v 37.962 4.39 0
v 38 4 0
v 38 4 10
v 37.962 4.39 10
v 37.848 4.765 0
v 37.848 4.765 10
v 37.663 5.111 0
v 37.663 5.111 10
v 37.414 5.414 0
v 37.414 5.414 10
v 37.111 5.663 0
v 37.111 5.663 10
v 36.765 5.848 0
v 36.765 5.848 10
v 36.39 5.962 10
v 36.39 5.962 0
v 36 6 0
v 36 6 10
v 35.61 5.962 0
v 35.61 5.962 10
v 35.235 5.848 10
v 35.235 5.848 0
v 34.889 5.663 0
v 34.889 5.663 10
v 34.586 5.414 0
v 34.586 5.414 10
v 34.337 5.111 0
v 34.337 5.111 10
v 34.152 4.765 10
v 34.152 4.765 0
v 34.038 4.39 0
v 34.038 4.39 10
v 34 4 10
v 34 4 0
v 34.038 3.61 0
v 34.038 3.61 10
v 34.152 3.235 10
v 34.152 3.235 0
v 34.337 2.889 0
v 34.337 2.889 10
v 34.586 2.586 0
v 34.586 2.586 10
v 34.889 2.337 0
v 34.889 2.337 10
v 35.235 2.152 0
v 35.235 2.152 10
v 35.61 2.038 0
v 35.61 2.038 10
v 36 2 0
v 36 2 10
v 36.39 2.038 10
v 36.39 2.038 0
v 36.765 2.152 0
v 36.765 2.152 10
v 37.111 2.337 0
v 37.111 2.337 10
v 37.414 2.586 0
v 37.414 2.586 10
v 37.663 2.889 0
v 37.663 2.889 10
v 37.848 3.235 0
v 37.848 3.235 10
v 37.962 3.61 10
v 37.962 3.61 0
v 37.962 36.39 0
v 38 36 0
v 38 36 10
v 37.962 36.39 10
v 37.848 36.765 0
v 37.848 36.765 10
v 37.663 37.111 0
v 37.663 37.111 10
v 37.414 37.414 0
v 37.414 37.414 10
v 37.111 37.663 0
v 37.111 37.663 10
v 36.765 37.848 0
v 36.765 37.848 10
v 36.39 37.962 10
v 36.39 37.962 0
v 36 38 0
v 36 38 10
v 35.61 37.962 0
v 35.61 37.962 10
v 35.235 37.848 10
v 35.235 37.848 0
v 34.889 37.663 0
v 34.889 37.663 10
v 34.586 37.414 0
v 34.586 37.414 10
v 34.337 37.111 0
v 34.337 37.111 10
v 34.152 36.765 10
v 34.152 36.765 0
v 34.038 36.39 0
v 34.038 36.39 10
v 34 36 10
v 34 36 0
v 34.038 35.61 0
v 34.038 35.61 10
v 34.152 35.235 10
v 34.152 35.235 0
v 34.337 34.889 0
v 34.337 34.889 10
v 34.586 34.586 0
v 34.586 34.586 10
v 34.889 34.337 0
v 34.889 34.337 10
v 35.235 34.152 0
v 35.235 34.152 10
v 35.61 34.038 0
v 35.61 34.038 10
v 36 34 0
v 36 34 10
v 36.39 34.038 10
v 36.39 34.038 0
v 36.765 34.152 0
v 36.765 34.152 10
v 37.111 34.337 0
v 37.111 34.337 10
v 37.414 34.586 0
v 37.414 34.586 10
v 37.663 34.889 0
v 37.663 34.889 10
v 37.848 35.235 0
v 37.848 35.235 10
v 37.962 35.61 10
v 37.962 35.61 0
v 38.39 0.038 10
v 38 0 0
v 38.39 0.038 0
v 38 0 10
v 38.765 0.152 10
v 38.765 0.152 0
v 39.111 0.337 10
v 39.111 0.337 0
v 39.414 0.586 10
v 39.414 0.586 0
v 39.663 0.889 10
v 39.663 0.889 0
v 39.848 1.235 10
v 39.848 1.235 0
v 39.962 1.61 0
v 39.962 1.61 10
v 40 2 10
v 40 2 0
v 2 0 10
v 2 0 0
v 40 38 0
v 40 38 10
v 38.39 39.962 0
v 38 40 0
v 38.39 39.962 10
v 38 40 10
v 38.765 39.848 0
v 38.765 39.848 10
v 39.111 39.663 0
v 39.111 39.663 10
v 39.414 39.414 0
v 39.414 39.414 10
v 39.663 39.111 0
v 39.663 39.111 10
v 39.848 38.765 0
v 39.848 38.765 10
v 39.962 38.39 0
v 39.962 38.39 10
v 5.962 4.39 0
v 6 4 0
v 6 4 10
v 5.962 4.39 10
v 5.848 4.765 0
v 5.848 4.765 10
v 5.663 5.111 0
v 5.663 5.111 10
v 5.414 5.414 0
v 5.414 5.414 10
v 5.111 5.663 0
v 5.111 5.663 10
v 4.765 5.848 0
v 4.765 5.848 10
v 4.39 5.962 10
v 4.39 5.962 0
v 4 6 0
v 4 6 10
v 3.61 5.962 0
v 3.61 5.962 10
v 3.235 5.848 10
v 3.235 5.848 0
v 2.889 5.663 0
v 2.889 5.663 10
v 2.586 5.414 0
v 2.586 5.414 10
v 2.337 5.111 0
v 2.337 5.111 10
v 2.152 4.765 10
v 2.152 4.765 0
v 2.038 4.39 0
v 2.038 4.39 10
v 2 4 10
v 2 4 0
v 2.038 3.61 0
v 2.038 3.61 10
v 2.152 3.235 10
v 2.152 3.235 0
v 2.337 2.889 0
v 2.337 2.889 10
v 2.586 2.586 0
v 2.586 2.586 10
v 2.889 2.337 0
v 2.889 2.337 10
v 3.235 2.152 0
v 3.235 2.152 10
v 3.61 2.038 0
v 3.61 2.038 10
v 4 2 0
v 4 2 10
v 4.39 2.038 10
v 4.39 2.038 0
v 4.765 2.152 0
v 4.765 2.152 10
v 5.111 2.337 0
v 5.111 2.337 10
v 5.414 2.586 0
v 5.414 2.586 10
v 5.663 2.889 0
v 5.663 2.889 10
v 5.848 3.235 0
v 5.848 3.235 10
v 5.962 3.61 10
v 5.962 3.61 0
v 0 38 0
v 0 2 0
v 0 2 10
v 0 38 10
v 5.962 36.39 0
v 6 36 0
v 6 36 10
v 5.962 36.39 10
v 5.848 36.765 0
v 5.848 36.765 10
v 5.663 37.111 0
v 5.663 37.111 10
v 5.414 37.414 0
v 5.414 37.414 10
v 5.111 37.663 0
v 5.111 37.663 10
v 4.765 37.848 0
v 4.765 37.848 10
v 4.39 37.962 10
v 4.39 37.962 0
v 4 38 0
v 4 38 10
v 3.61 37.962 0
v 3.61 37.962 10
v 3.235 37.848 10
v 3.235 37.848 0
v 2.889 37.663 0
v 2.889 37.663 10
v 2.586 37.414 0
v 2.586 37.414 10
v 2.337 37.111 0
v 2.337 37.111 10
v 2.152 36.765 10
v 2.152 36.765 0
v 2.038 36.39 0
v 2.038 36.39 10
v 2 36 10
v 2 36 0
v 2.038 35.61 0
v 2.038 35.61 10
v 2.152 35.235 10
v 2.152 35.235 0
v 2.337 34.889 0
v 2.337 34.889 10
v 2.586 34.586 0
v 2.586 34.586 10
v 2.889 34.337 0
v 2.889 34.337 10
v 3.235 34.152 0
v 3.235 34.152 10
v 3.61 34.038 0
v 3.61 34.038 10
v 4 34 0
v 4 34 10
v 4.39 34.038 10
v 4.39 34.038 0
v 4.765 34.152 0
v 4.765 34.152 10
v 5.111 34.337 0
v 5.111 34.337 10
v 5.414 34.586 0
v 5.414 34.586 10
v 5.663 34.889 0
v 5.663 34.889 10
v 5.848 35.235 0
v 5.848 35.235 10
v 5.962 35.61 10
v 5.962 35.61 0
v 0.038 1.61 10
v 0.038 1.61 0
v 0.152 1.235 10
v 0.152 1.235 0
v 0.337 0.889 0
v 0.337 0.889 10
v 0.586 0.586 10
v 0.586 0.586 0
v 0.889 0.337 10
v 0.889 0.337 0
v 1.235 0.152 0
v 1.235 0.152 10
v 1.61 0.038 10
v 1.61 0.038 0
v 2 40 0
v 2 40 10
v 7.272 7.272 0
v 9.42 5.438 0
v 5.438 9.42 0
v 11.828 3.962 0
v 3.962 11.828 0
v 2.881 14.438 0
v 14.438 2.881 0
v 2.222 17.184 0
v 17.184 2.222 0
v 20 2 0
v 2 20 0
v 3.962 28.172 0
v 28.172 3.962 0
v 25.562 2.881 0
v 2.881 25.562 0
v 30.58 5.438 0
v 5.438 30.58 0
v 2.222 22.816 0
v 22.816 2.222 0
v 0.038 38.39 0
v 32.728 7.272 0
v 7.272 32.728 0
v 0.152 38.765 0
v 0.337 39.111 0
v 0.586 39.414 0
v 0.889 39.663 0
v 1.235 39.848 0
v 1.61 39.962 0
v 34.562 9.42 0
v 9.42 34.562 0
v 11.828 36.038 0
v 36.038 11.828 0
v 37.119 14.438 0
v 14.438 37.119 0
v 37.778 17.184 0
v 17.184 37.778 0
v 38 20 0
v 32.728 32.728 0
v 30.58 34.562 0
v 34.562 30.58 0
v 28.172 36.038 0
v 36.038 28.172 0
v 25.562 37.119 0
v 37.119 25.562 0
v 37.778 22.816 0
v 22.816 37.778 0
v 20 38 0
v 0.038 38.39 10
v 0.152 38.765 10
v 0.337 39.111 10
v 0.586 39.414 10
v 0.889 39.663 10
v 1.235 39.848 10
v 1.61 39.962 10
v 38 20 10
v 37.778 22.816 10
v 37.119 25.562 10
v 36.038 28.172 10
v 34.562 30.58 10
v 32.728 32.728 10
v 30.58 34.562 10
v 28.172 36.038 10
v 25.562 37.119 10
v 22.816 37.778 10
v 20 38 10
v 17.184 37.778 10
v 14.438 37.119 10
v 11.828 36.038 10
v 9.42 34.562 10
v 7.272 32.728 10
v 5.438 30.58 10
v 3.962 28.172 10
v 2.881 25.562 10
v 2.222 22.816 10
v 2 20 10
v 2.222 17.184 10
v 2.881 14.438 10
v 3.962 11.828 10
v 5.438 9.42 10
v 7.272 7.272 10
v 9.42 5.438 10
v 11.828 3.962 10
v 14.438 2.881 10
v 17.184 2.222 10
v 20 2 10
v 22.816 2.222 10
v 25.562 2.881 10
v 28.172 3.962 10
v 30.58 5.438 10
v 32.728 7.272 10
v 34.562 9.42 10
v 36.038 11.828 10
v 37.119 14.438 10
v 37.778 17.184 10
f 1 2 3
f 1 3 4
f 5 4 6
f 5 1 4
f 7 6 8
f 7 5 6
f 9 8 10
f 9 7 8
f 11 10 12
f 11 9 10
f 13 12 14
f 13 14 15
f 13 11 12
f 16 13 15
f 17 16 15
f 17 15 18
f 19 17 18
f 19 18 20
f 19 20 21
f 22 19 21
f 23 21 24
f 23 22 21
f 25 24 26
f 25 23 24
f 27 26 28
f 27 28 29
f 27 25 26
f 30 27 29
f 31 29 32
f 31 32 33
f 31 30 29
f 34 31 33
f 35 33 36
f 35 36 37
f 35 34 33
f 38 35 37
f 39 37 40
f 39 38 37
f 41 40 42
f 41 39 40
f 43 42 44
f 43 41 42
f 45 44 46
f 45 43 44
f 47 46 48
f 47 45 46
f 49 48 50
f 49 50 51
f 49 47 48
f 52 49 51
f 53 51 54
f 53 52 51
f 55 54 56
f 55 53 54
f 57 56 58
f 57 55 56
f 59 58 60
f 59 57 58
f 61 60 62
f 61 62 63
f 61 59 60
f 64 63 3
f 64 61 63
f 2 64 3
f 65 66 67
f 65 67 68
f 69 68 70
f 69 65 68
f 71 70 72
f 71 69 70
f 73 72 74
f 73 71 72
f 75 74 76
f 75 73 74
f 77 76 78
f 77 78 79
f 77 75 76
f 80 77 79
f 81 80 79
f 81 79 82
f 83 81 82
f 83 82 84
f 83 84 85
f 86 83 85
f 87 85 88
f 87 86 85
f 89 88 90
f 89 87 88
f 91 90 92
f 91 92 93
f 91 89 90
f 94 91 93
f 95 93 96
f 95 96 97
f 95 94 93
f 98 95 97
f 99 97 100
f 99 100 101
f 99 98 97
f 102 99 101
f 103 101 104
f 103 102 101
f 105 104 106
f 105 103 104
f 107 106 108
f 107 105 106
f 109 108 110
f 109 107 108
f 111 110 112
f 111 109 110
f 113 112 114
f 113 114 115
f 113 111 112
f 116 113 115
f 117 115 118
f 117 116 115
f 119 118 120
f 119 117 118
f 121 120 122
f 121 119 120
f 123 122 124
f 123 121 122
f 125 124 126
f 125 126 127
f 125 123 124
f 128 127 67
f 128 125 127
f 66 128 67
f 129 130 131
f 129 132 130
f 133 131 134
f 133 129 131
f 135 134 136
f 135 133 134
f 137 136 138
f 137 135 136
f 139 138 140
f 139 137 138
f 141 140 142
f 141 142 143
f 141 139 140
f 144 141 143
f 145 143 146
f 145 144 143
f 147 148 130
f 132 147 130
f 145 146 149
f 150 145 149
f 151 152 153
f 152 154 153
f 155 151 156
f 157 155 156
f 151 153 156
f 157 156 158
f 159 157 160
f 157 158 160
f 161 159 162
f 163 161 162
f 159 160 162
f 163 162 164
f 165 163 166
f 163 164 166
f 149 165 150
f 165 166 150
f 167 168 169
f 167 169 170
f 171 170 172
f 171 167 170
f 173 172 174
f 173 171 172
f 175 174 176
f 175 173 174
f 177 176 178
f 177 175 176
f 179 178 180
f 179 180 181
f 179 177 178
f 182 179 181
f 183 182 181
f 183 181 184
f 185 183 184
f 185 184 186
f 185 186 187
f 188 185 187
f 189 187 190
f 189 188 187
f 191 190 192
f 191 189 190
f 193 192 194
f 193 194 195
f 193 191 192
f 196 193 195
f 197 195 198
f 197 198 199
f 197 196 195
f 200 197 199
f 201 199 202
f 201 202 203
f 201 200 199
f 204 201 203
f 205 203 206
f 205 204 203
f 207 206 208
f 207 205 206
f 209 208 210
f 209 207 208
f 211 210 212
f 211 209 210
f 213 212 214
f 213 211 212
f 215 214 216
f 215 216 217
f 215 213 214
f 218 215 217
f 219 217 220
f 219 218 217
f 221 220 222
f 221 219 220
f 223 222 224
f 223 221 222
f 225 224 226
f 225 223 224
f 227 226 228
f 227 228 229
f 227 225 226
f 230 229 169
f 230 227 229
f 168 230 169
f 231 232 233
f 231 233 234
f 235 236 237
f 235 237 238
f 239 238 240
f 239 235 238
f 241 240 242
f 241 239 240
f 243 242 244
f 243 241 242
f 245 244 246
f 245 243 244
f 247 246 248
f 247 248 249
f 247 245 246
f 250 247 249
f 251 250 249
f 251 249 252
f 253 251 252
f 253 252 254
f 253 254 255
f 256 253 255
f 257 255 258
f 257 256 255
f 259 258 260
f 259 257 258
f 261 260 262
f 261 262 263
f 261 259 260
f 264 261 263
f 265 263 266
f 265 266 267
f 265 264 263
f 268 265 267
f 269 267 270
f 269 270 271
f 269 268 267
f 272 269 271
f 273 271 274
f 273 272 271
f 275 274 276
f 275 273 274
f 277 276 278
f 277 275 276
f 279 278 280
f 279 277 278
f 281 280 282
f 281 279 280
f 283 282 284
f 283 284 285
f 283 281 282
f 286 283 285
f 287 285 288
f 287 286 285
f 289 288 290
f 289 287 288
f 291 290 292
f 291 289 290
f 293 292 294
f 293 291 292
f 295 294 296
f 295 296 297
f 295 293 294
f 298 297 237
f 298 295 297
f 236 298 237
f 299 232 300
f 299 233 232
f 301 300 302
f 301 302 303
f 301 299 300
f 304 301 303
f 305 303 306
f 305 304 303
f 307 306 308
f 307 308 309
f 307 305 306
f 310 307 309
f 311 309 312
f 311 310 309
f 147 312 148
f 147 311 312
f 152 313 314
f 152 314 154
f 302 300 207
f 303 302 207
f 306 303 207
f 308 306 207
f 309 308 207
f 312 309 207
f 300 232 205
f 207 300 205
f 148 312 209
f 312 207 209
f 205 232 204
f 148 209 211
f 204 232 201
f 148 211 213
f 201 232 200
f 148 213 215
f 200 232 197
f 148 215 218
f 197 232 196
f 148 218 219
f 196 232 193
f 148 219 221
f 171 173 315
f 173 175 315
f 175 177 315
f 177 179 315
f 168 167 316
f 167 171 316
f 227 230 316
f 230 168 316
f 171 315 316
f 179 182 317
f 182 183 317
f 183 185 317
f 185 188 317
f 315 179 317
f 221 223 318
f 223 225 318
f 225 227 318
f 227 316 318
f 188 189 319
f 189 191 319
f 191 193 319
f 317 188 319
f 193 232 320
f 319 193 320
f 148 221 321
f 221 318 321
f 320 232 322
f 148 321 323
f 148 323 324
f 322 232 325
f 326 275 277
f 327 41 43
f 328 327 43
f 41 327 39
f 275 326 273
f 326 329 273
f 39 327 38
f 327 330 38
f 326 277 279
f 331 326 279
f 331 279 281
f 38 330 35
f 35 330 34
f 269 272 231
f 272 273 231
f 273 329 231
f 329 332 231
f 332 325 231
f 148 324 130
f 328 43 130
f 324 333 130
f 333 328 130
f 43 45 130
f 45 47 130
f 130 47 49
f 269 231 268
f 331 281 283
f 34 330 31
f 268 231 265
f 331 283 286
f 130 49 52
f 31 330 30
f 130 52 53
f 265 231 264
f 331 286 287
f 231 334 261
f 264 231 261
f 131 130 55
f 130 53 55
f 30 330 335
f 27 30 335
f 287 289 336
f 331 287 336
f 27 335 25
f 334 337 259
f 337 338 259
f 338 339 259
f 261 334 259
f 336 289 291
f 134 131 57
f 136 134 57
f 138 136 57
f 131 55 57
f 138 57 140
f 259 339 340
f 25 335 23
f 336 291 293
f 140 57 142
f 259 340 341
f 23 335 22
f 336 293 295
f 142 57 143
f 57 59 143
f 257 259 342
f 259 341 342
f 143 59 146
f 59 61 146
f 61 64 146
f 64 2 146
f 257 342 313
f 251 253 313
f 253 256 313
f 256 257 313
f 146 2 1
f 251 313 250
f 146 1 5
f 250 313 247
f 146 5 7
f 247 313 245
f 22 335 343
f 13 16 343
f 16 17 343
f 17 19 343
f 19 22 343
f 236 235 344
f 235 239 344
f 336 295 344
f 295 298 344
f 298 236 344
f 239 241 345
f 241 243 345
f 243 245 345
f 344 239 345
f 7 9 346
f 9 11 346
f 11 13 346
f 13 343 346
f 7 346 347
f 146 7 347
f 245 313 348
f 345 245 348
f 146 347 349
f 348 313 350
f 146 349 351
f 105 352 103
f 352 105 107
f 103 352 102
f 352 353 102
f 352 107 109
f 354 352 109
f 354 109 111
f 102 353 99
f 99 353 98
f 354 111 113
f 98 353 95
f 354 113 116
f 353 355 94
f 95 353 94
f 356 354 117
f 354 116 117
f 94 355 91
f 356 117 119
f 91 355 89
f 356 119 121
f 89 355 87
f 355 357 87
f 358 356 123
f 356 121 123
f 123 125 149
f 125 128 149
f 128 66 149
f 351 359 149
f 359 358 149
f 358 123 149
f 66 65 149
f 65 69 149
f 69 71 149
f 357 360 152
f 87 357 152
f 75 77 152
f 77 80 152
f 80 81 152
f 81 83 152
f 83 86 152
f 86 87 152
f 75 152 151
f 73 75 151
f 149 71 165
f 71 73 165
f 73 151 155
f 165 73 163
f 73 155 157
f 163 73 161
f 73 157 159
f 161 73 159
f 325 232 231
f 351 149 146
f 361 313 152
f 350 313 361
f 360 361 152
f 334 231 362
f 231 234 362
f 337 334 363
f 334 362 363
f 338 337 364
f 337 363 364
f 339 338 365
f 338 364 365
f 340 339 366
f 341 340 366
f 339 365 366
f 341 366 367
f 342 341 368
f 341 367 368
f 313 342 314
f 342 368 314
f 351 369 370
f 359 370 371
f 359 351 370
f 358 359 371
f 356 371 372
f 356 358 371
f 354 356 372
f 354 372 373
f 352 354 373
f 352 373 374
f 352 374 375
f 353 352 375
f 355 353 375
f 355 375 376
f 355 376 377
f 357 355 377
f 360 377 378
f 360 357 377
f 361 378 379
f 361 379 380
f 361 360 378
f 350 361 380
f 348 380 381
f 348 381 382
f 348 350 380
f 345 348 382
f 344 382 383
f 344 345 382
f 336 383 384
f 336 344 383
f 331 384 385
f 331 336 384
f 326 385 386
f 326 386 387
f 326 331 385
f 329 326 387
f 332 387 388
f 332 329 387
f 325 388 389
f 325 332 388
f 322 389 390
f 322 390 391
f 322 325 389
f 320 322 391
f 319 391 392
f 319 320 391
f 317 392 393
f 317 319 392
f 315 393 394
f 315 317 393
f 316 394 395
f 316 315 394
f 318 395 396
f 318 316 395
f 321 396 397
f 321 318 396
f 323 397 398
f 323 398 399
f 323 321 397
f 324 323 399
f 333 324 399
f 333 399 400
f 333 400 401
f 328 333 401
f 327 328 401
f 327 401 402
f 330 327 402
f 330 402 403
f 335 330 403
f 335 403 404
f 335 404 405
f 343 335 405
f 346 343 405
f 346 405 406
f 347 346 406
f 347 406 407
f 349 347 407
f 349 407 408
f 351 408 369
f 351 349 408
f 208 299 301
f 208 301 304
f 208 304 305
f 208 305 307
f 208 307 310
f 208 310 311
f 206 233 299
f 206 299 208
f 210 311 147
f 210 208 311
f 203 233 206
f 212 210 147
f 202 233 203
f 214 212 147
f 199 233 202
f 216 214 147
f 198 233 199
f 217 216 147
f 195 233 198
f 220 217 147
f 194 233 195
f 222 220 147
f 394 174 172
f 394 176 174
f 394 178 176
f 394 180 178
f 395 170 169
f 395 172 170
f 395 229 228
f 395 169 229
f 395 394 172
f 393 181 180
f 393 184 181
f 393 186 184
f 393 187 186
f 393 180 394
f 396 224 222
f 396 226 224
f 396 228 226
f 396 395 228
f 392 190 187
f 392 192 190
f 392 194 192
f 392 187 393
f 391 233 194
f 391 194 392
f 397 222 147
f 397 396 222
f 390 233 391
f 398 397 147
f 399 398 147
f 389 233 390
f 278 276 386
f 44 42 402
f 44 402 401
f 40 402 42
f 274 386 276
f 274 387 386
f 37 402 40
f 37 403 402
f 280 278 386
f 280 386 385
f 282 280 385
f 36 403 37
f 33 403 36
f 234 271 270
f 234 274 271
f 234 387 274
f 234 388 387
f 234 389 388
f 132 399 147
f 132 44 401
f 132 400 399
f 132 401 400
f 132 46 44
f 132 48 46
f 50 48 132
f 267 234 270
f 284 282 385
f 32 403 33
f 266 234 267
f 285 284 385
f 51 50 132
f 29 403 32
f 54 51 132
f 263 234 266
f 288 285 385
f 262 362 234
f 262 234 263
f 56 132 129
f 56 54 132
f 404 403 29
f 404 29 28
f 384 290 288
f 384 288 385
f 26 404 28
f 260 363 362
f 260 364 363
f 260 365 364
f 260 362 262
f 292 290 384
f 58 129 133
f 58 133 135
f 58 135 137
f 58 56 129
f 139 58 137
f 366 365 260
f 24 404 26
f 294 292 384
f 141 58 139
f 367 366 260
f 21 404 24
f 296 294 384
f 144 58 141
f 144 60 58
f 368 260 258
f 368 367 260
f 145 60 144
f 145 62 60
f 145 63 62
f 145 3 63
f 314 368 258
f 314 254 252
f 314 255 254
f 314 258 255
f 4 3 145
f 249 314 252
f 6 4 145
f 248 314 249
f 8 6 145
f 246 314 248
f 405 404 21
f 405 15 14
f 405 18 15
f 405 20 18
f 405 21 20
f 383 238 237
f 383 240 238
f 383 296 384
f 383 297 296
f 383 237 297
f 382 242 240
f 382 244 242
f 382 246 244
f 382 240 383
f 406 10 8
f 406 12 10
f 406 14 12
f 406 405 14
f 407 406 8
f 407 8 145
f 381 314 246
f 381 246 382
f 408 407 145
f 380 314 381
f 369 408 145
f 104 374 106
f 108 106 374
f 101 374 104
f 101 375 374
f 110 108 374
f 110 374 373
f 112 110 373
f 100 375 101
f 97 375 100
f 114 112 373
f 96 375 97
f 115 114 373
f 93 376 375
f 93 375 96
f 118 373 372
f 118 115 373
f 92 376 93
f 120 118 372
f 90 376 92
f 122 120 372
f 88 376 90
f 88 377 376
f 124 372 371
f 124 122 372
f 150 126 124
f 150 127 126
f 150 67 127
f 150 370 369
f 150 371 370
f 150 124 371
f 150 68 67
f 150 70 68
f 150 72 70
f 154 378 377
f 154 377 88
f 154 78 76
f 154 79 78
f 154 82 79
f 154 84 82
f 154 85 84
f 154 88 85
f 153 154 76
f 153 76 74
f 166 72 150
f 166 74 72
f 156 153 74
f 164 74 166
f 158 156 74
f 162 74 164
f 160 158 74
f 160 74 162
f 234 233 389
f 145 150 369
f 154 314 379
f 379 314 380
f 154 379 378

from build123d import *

# Parameters (mm, degrees)
SKETCH_W   = 40
SKETCH_H   = 40
SKETCH_R   = 18
SKETCH_R_2 = 2
PAD_DEPTH  = 10
FILLET_R   = 2


with BuildPart() as part:
    # Sketch → Pad (new body)
    with BuildSketch(Plane.XY):
        with Locations((20, 20)):
            Rectangle(SKETCH_W, SKETCH_H)
        with Locations((20, 20)):
            Circle(SKETCH_R, mode=Mode.SUBTRACT)
        with Locations((4, 36)):
            Circle(SKETCH_R_2, mode=Mode.SUBTRACT)
        with Locations((36, 36)):
            Circle(SKETCH_R_2, mode=Mode.SUBTRACT)
        with Locations((36, 4)):
            Circle(SKETCH_R_2, mode=Mode.SUBTRACT)
        with Locations((4, 4)):
            Circle(SKETCH_R_2, mode=Mode.SUBTRACT)
    extrude(amount=PAD_DEPTH)

    # Fillet
    fillet_edges = [part.edges().sort_by_distance(p)[0] for p in [
        (40, 0, 5),
        (0, 0, 5),
        (40, 40, 5),
        (0, 40, 5),
    ]]
    fillet(fillet_edges, radius=FILLET_R)


solid = part.part
